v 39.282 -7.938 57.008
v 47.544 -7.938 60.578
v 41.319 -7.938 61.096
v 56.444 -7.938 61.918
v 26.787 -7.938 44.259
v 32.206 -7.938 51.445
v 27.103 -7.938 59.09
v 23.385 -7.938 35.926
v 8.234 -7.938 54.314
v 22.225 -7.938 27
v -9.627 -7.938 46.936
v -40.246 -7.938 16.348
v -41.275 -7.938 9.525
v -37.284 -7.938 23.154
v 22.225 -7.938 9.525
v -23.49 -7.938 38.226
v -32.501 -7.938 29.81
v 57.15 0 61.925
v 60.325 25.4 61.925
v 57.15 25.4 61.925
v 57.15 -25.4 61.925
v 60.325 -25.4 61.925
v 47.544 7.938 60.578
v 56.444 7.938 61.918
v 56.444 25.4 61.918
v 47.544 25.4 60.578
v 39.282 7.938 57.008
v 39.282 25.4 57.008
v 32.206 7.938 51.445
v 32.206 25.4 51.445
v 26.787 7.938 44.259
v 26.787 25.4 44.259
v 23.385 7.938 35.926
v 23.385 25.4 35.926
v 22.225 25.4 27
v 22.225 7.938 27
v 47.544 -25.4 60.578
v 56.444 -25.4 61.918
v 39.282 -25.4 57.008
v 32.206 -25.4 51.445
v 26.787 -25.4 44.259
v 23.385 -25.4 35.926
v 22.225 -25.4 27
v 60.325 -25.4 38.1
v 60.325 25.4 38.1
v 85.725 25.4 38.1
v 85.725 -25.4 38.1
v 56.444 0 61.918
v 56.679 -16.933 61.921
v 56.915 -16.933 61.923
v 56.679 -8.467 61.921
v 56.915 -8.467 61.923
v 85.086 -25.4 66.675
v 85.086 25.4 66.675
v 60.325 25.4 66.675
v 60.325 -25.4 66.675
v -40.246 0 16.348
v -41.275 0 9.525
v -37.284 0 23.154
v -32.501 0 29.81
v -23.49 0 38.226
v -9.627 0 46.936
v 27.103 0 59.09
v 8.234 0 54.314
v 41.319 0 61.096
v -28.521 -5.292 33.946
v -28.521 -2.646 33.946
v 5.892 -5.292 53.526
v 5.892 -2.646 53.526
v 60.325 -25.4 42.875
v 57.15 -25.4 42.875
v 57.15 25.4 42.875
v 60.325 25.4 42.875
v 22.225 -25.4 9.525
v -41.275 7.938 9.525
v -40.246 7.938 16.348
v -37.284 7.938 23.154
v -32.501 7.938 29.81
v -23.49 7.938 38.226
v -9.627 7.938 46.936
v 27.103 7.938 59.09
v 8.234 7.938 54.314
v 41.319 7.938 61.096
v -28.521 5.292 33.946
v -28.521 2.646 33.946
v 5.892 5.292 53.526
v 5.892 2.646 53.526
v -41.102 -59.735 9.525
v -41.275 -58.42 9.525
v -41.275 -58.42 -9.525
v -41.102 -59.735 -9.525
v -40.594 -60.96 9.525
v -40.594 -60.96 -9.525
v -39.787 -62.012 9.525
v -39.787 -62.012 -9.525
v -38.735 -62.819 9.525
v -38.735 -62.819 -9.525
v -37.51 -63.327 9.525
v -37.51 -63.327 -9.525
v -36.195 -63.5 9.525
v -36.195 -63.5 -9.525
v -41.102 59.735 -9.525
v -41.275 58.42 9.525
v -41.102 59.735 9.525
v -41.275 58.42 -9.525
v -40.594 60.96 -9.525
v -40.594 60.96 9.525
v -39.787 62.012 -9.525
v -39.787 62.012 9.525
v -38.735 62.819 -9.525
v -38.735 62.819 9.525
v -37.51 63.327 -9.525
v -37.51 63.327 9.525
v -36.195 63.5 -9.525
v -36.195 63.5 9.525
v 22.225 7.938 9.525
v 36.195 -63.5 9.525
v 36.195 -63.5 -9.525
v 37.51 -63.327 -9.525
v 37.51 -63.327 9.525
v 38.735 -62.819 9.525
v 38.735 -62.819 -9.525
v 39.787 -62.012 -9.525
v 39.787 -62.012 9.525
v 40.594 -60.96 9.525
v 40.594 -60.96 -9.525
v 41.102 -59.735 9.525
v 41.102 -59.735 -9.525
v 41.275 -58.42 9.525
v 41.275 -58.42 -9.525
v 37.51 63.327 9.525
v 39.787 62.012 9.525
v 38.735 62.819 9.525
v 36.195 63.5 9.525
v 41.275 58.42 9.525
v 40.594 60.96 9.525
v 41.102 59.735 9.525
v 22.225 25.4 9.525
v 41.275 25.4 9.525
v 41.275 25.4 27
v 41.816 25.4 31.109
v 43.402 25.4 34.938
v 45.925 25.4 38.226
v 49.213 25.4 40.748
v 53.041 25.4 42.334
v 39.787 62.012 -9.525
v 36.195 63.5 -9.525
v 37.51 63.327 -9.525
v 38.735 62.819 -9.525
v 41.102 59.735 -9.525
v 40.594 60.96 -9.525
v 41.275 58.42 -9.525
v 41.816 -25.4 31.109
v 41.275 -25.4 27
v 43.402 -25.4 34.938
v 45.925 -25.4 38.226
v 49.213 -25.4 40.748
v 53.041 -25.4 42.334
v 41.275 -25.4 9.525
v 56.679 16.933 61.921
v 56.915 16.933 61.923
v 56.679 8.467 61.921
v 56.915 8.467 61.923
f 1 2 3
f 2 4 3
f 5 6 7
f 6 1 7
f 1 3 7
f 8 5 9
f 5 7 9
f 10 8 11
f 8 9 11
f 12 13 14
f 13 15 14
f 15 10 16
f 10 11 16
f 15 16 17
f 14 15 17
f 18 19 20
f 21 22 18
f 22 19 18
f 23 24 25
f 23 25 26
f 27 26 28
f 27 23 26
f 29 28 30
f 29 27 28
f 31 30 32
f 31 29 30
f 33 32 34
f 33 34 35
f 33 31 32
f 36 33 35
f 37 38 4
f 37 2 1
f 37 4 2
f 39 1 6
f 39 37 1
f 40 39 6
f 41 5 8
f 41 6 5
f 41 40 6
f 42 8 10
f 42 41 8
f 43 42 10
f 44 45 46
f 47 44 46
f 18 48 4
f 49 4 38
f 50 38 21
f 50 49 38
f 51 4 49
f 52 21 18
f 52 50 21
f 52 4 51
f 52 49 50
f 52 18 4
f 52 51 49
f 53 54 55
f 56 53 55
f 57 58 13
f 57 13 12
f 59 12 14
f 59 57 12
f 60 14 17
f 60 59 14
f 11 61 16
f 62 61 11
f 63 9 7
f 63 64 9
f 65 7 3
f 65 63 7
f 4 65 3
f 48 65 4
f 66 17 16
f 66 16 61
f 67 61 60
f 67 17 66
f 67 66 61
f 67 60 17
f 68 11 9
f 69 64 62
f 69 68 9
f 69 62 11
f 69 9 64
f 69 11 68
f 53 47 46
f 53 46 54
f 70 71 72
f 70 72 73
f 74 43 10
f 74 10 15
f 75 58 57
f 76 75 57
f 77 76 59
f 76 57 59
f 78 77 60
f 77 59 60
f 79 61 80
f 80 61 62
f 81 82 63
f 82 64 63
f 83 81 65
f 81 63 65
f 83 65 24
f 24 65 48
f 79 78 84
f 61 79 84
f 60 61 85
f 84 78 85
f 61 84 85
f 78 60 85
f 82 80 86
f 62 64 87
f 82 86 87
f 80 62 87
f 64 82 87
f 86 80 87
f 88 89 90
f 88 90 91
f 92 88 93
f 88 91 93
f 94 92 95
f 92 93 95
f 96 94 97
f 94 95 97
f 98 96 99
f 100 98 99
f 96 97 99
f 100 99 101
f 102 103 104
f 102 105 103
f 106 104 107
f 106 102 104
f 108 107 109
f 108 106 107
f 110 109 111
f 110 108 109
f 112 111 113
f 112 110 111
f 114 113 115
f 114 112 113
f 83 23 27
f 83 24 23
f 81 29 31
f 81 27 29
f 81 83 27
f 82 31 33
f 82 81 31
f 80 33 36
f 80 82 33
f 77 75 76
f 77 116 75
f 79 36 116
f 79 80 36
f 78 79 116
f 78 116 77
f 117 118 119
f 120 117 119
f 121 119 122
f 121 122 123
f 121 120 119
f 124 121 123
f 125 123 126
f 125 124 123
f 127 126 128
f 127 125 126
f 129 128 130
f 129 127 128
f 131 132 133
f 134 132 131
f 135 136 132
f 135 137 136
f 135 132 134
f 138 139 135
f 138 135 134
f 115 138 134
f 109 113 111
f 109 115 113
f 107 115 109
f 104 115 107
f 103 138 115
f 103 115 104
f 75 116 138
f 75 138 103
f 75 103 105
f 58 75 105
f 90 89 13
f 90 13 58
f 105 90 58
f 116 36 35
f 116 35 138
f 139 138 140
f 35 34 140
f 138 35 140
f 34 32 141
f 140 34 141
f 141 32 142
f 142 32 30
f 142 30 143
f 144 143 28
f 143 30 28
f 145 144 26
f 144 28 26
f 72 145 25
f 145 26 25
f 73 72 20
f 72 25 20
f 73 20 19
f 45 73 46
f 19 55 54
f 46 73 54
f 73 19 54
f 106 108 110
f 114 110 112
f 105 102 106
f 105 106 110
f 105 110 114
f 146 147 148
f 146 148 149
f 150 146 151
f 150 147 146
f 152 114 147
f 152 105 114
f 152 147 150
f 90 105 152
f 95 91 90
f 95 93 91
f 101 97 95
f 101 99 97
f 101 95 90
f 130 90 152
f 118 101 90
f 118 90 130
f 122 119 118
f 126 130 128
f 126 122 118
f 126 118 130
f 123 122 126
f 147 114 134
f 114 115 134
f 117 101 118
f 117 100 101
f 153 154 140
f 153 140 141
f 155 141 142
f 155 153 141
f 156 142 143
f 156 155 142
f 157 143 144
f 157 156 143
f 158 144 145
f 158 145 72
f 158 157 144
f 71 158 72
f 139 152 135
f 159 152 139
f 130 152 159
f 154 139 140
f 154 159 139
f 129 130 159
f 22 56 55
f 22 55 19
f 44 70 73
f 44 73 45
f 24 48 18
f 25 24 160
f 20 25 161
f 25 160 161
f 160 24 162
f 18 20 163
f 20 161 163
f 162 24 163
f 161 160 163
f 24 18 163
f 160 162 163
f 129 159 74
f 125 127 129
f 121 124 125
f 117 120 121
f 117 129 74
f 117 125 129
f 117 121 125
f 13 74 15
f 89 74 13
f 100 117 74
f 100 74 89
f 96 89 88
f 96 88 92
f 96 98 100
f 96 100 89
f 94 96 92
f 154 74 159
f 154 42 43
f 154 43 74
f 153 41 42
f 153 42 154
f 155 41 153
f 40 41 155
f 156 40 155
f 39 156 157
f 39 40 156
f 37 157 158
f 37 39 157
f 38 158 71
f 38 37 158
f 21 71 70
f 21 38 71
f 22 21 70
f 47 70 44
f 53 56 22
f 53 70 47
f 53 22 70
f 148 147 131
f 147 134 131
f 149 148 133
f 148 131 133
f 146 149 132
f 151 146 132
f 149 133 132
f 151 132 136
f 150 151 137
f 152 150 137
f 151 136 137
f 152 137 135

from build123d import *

# Parameters (mm, degrees)
F1_DEPTH = 63.5
F2_DEPTH = 25.4
F3_DEPTH = 7.9375
F4_R     = 5.08


with BuildPart() as f1:
    # F0 (on Front) → F1 (new body, symmetric)
    with BuildSketch(Plane.XZ):
        Polygon((-41.275, 9.525), (-41.275, -9.525), (41.275, -9.525), (41.275, 9.525), (22.225, 9.525), align=None)
    extrude(amount=F1_DEPTH, both=True)

    # F0 (on Front) → F2 (join, symmetric)
    with BuildSketch(Plane.XZ):
        with BuildLine():
            Line((22.225, 9.525), (41.275, 9.525))
            Line((41.275, 9.525), (41.275, 27.0002))
            ThreePointArc((41.275, 27.0002), (45.92468, 38.22552), (57.15, 42.8752))
            Line((57.15, 42.8752), (60.325, 42.8752))
            Line((60.325, 42.8752), (60.325, 61.9252))
            Line((60.325, 61.9252), (57.15, 61.9252))
            add(Edge.make_bspline(
                [(56.444235, 61.918068), (56.679218, 61.920897), (56.914473, 61.923274), (57.15, 61.9252)],
                knots=[111.045003, 111.045003, 111.045003, 111.045003, 111.504536, 111.504536, 111.504536, 111.504536], degree=3))
            ThreePointArc((56.444235, 61.918068), (32.206018, 51.445105), (22.225, 27.0002))
            Line((22.225, 27.0002), (22.225, 9.525))
        make_face()
        Polygon((60.325, 66.675), (60.325, 61.9252), (60.325, 42.8752), (60.325, 38.1), (85.725, 38.1), (85.086263, 66.675), align=None)
    extrude(amount=F2_DEPTH, both=True)

    # F0 (on Front) → F3 (join, symmetric)
    with BuildSketch(Plane.XZ):
        with BuildLine():
            add(Edge.make_bspline(
                [(-41.275, 9.525), (-41.190063, 34.252091), (-0.338804, 61.234613), (56.444235, 61.918068)],
                knots=[0, 0, 0, 0, 111.045003, 111.045003, 111.045003, 111.045003], degree=3))
            Line((-41.275, 9.525), (22.225, 9.525))
            Line((22.225, 9.525), (22.225, 27.0002))
            ThreePointArc((22.225, 27.0002), (32.206018, 51.445105), (56.444235, 61.918068))
        make_face()
    extrude(amount=F3_DEPTH, both=True)

    # F4
    f4_edges = [f1.edges().sort_by_distance(p)[0] for p in [
        (41.275, -63.5, 0),
        (-41.275, -63.5, 0),
        (41.275, 63.5, 0),
        (-41.275, 63.5, 0),
    ]]
    fillet(f4_edges, radius=F4_R)


solid = f1.part
